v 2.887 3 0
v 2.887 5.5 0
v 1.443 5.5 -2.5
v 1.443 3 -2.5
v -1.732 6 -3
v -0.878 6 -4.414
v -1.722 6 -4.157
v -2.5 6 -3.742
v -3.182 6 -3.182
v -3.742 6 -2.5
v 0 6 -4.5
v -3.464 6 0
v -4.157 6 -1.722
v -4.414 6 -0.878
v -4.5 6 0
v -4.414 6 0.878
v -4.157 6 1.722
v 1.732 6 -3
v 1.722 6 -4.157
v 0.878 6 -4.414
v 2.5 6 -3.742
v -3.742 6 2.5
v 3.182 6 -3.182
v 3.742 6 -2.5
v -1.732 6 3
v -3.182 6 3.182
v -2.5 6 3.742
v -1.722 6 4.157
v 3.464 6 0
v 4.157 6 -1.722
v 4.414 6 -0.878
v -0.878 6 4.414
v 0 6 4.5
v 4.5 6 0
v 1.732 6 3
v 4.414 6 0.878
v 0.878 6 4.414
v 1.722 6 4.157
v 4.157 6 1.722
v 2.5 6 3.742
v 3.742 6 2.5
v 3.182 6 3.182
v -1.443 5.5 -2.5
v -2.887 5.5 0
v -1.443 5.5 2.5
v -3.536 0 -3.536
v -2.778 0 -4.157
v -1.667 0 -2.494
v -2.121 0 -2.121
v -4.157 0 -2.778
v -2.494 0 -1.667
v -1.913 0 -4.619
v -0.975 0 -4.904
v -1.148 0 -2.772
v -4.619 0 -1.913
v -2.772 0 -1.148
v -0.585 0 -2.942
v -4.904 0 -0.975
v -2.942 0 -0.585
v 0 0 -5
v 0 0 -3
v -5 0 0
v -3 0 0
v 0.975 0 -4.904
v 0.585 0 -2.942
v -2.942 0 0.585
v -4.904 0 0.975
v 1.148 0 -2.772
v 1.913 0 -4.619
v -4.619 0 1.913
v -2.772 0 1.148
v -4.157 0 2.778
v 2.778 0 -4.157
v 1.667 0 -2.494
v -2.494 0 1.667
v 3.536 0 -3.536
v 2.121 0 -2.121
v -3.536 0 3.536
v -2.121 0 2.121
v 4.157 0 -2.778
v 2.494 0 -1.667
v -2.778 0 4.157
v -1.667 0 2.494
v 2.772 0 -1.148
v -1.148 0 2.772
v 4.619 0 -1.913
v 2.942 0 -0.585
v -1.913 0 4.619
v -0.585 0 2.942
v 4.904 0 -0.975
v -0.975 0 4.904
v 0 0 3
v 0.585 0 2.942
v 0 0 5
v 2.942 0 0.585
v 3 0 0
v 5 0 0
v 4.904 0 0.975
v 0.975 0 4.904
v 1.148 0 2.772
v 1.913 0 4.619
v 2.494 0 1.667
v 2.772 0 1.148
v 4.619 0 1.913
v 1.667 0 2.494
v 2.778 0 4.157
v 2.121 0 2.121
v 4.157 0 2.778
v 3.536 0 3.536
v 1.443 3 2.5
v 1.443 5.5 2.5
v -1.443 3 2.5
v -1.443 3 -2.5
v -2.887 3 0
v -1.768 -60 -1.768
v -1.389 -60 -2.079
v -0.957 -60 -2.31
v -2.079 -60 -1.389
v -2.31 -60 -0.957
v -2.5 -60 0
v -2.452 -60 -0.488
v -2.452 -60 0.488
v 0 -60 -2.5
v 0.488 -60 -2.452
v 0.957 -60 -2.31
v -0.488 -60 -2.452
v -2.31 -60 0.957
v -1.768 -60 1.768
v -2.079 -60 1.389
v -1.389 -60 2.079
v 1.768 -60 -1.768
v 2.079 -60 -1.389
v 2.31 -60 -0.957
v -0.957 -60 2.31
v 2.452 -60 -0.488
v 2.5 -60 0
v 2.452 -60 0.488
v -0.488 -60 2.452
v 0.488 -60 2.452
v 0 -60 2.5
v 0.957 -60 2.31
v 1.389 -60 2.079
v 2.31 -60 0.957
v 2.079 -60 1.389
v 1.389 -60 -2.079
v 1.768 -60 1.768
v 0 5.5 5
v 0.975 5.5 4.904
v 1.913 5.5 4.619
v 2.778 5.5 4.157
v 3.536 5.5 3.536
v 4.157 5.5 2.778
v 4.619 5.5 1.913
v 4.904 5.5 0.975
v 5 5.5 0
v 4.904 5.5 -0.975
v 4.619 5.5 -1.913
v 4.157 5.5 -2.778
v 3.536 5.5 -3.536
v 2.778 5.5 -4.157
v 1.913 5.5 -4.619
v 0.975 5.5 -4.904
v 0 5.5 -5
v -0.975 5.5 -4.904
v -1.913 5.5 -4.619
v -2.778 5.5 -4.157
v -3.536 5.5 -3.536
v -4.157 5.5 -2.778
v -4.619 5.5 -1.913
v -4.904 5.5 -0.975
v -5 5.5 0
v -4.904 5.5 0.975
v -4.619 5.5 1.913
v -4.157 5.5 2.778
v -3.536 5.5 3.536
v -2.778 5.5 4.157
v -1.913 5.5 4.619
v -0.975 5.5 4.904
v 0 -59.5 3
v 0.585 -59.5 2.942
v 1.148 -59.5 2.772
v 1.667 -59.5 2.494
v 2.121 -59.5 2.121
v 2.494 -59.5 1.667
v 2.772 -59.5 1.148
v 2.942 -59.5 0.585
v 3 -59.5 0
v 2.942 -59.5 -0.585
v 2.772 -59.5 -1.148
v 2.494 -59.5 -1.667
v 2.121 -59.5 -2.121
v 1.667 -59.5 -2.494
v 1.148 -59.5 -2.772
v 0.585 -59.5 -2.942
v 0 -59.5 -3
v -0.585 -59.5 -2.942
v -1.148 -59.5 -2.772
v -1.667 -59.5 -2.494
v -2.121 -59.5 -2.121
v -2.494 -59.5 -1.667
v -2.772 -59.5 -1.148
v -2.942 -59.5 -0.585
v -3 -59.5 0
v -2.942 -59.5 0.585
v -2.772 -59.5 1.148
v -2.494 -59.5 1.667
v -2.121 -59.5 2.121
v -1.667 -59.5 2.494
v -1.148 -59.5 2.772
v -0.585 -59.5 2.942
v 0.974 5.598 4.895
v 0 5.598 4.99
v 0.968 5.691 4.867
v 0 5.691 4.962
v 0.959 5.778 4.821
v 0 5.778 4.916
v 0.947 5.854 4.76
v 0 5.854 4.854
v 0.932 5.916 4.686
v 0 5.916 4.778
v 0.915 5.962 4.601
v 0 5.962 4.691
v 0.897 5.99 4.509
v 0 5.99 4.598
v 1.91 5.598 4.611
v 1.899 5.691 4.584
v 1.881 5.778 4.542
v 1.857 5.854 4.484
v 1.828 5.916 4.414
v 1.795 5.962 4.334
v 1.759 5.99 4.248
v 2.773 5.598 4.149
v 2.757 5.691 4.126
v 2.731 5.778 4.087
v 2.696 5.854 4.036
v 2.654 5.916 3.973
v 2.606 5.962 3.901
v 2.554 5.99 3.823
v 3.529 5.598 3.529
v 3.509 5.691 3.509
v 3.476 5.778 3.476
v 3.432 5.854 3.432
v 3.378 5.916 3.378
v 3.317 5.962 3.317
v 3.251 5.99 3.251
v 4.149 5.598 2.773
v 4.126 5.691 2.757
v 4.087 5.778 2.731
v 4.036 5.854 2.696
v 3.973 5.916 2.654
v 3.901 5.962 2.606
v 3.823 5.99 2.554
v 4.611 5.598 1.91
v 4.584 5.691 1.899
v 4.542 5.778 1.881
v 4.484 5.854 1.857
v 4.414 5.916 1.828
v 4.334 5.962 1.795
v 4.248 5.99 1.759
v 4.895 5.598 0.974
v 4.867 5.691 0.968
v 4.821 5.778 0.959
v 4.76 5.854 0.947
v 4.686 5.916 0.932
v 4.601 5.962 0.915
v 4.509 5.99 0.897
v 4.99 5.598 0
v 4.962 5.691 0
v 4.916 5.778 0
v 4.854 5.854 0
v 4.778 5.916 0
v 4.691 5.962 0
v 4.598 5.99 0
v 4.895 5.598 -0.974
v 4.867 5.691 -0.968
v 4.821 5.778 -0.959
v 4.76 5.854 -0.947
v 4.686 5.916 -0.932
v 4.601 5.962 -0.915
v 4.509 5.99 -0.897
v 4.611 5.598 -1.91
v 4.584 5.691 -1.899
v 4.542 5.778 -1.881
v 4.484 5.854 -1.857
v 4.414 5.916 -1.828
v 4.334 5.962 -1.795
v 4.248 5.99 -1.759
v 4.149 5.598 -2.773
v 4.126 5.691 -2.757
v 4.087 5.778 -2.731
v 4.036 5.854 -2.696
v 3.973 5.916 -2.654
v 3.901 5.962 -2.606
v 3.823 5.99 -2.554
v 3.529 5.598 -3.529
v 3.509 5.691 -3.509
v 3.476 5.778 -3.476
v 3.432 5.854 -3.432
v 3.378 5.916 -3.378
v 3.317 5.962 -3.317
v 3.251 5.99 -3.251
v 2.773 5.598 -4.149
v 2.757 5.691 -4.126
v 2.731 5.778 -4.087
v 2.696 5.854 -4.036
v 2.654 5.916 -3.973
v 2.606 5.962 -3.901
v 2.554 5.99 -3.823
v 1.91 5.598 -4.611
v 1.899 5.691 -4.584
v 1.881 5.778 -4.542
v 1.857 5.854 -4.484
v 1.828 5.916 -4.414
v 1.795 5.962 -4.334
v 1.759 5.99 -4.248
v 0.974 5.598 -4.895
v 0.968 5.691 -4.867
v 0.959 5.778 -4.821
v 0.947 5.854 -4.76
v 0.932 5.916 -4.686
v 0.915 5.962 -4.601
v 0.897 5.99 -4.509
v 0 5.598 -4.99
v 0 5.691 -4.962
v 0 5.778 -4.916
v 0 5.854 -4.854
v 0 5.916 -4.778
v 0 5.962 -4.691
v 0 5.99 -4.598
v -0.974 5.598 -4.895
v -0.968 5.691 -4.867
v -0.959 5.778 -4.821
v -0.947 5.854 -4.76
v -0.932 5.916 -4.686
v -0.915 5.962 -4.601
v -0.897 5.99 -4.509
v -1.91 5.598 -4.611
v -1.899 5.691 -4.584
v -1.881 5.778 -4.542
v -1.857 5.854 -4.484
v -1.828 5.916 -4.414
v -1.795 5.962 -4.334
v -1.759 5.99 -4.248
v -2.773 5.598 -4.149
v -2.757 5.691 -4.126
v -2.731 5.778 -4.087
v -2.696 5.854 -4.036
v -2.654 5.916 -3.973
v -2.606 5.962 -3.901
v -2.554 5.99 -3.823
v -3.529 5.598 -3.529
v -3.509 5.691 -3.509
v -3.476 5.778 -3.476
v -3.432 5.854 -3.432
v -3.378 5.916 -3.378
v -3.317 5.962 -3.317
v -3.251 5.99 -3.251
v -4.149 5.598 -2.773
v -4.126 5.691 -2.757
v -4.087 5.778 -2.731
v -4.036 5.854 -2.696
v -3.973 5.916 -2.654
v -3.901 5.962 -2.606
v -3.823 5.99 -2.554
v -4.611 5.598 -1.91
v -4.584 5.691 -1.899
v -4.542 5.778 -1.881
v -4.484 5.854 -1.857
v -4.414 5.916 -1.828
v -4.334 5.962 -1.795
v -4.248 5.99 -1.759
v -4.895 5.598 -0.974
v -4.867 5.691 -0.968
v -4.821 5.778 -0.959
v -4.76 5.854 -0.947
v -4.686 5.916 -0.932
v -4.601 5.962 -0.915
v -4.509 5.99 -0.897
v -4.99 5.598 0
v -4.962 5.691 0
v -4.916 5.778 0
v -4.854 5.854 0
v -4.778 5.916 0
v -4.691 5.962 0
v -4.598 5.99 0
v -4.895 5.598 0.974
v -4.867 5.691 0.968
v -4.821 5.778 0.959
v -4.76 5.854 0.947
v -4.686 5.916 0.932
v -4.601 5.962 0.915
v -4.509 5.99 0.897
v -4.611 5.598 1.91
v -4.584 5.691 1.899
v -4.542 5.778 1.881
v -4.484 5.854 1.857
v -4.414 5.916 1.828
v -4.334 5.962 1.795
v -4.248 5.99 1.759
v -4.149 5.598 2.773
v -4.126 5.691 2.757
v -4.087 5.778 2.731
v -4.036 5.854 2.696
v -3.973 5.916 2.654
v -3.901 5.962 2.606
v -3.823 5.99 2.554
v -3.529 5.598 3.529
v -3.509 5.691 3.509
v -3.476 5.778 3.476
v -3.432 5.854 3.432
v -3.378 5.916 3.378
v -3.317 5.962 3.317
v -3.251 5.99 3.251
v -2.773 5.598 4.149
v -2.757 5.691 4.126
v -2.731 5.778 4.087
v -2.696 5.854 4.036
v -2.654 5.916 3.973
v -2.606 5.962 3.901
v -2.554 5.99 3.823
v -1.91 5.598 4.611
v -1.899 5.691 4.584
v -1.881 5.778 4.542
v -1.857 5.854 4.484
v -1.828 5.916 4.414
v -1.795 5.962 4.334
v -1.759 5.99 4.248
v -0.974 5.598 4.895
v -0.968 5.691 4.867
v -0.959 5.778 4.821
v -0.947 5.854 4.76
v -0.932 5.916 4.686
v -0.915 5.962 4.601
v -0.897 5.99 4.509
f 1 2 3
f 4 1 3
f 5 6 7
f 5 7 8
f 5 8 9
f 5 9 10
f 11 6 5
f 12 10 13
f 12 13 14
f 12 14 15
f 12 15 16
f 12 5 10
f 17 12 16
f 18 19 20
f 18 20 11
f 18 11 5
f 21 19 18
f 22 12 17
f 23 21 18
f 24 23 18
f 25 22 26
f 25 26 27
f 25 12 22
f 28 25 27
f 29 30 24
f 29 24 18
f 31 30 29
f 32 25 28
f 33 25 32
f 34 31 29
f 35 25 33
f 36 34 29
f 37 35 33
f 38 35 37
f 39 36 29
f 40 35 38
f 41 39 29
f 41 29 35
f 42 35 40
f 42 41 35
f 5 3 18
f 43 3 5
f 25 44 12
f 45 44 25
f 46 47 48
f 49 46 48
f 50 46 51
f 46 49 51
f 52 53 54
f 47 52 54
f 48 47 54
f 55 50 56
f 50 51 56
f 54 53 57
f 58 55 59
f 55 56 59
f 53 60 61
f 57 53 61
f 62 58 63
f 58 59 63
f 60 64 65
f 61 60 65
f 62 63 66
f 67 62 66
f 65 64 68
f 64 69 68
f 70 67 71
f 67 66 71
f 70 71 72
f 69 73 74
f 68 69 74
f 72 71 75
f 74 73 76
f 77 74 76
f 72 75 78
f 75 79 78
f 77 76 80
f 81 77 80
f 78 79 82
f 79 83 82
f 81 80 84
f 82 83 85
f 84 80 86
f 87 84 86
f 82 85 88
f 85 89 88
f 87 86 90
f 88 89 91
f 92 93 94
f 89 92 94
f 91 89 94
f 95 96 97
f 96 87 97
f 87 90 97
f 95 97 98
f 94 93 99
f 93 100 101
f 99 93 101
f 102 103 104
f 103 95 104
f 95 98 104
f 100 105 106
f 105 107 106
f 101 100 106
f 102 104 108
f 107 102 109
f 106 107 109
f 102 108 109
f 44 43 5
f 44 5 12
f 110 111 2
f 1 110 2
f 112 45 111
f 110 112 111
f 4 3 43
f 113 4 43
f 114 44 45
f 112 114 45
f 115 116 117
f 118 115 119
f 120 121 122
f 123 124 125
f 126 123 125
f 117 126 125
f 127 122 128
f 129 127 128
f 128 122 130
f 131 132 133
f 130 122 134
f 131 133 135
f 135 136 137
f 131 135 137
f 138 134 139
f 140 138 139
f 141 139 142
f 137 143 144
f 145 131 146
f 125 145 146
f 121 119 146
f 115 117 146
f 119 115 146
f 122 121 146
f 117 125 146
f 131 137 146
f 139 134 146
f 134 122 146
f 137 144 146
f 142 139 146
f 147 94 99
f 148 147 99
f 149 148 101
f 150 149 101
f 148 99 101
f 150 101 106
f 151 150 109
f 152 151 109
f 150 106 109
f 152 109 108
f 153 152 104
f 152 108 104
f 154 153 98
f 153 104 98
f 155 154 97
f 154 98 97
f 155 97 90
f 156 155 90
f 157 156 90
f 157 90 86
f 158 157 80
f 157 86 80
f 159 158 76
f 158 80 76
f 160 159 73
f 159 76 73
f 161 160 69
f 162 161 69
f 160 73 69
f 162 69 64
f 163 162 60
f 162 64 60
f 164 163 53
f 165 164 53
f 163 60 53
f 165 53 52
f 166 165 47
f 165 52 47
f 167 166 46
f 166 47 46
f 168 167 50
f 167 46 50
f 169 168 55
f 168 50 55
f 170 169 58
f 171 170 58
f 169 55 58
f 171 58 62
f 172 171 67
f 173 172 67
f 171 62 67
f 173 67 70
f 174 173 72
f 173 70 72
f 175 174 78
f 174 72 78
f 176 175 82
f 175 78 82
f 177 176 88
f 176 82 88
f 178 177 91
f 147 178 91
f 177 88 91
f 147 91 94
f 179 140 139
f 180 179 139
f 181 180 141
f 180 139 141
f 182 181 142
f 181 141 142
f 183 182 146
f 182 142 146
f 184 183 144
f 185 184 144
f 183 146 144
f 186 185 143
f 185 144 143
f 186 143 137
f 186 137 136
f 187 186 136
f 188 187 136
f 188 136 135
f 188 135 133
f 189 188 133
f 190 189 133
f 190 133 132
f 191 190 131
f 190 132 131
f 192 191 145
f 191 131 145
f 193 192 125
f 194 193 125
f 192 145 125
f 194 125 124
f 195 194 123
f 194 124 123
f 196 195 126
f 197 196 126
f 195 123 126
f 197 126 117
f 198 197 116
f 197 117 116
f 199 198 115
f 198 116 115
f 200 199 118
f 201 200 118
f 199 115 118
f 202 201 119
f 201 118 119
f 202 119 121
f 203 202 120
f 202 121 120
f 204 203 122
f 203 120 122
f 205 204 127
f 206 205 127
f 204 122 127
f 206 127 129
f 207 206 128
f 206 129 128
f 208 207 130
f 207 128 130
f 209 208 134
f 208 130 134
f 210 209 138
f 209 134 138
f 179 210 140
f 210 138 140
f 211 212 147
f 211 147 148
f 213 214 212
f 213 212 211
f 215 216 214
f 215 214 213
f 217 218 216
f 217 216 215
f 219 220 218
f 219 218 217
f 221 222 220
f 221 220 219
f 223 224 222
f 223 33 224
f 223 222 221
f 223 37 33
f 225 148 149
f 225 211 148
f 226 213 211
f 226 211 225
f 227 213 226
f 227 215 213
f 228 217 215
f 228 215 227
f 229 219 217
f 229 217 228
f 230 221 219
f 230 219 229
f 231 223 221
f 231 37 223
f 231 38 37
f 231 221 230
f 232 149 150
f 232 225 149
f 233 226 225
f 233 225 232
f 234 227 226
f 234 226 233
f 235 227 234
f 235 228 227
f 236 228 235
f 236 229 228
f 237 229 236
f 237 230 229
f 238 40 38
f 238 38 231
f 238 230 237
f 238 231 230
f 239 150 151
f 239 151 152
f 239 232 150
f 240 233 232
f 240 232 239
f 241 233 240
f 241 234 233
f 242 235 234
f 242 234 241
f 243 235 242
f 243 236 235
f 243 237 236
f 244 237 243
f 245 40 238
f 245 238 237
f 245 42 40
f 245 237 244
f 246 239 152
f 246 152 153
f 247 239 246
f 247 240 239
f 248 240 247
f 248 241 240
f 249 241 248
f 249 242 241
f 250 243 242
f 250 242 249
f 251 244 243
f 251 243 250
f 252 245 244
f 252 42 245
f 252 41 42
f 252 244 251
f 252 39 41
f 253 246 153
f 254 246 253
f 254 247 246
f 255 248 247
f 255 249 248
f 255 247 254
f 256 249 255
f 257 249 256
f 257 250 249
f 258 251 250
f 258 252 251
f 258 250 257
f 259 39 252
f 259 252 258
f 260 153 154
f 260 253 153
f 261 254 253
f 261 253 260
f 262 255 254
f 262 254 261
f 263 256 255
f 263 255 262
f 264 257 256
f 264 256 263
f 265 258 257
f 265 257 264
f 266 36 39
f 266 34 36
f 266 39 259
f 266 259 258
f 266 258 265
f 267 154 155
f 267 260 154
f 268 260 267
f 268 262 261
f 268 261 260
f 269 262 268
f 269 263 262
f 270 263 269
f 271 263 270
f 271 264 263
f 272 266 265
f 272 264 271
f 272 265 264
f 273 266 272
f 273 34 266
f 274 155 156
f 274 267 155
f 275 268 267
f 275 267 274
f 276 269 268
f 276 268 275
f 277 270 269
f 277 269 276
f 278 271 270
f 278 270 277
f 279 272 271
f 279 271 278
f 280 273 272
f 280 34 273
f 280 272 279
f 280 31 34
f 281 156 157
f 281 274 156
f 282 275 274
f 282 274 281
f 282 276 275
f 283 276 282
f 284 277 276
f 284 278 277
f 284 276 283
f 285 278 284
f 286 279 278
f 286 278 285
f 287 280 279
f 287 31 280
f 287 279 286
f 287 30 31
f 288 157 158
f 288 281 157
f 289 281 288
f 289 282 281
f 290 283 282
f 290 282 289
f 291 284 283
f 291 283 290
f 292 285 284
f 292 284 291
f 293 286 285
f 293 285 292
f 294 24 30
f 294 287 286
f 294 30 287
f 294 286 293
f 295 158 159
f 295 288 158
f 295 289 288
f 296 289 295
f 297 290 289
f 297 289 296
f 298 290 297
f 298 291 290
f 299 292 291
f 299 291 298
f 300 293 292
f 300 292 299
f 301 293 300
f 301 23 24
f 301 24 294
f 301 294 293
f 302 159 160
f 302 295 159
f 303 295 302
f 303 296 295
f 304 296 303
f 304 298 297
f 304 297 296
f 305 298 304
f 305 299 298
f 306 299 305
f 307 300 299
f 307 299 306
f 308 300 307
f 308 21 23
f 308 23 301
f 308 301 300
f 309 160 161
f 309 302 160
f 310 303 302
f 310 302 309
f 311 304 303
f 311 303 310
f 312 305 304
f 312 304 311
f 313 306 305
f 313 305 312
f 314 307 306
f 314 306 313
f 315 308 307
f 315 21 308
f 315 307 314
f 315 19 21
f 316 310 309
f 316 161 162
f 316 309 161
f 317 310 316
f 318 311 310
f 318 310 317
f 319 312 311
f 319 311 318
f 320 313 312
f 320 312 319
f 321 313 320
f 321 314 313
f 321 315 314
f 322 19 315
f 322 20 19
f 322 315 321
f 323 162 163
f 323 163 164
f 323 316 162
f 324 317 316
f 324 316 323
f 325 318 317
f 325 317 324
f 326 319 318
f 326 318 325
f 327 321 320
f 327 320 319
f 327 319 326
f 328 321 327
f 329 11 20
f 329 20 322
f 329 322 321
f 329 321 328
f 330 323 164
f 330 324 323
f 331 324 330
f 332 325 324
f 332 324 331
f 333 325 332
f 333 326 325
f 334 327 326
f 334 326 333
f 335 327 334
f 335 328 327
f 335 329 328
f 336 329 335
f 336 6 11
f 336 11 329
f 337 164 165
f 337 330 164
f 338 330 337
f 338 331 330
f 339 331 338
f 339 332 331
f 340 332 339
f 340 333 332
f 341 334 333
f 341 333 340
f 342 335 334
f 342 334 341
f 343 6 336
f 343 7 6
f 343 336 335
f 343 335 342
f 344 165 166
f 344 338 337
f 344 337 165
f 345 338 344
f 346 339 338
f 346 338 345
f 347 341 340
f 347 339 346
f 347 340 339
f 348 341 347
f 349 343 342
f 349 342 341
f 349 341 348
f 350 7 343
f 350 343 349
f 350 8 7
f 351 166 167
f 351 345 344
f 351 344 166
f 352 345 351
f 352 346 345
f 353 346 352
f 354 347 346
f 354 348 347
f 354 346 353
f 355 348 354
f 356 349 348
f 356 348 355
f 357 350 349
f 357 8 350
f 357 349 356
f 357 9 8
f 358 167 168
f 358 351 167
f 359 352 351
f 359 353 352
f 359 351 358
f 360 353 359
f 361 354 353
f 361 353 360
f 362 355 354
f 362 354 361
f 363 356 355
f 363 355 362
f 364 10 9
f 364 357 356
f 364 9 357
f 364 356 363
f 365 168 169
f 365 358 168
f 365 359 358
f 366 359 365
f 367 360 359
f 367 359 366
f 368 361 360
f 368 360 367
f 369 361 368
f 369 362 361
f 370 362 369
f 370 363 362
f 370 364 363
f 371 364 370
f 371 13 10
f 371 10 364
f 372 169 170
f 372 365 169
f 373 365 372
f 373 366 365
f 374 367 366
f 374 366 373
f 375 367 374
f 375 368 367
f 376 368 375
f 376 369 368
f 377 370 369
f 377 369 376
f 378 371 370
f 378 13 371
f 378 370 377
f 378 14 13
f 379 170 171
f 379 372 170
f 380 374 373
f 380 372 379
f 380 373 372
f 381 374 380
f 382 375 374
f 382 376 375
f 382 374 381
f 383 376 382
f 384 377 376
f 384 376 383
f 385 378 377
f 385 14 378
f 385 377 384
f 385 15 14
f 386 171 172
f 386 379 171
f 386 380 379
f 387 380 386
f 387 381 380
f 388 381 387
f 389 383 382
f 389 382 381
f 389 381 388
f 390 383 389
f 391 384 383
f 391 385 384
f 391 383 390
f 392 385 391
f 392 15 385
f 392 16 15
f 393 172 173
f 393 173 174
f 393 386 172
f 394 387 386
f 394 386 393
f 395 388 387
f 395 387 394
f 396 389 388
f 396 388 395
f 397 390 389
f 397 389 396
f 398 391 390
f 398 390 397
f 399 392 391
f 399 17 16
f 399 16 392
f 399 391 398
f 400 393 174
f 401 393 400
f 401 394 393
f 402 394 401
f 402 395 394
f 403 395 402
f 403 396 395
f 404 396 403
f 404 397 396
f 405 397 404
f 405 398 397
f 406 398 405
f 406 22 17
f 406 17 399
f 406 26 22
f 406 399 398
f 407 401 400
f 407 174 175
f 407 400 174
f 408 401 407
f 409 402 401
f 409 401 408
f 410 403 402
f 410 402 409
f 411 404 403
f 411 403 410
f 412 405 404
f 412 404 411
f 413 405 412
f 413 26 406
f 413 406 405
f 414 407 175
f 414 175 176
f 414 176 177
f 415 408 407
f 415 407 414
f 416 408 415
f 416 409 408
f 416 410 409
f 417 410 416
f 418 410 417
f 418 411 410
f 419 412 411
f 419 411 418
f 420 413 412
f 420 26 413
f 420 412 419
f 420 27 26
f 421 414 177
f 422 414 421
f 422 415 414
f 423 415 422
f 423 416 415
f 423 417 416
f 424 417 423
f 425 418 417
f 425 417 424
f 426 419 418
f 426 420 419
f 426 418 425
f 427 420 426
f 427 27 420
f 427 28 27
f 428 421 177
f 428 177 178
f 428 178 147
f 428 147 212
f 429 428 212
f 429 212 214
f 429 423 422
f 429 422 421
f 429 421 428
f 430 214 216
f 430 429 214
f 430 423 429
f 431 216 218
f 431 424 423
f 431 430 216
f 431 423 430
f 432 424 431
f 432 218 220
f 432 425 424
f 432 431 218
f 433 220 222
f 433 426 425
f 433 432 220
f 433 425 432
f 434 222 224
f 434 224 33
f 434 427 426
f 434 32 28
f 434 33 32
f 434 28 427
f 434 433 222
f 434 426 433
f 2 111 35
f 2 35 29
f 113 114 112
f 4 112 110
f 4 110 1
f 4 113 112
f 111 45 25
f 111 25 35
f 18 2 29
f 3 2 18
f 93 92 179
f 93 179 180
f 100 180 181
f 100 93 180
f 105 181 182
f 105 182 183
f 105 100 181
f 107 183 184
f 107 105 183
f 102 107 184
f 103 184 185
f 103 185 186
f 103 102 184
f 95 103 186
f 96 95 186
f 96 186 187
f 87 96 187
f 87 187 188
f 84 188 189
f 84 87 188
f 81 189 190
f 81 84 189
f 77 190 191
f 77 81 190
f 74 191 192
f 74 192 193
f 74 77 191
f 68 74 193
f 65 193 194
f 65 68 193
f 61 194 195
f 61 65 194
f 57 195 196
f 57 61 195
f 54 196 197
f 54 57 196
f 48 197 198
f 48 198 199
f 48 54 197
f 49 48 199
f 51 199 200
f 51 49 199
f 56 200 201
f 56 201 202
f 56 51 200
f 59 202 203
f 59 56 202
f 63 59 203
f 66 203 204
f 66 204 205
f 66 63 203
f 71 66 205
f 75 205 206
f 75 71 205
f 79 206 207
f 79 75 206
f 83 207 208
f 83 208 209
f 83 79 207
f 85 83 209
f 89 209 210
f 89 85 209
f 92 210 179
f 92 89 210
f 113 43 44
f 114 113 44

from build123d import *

# Parameters (mm, degrees)
ESBO_O1_R                = 3
RESSALTO_EXTRUS_O1_DEPTH = 60
ESBO_O2_R                = 5
RESSALTO_EXTRUS_O2_DEPTH = 6
FILETE1_R                = 0.5
CORTE_EXTRUS_O1_DEPTH    = 3
CHANFRO3_SIZE            = 0.5
CHANFRO4_SIZE            = 0.5


with BuildPart() as part:
    # Esboço1 → Ressalto-extrusão1 (new body)
    with BuildSketch(Plane(origin=(0, 0, 0), x_dir=(1, 0, 0), z_dir=(0, 1, 0))):
        with Locations(Location((0, 0, 0), (0, 0, 270))):
            Circle(ESBO_O1_R)
    extrude(amount=-RESSALTO_EXTRUS_O1_DEPTH)

    # Esboço2 → Ressalto-extrusão2 (add)
    with BuildSketch(Plane(origin=(0, 0, 0), x_dir=(1, 0, 0), z_dir=(0, 1, 0))):
        with Locations(Location((0, 0, 0), (0, 0, 270))):
            Circle(ESBO_O2_R)
    extrude(amount=RESSALTO_EXTRUS_O2_DEPTH)

    # Filete1
    filete1_edges = [part.edges().sort_by_distance(p)[0] for p in [
        (0, 6, -5),
    ]]
    fillet(filete1_edges, radius=FILETE1_R)

    # Esboço3 → Corte-extrusão1 (cut)
    with BuildSketch(Plane(origin=(0, 6, 0), x_dir=(1, 0, 0), z_dir=(0, 1, 0))):
        Polygon((2.886751346, 0), (1.443375673, 2.5), (-1.443375673, 2.5), (-2.886751346, 0), (-1.443375673, -2.5), (1.443375673, -2.5), align=None)
    extrude(amount=-CORTE_EXTRUS_O1_DEPTH, mode=Mode.SUBTRACT)

    # Chanfro3
    chanfro3_edges = [part.edges().sort_by_distance(p)[0] for p in [
        (2.165063509, 6, 1.25),
        (2.165063509, 6, -1.25),
        (0, 6, -2.5),
        (-2.165063509, 6, -1.25),
        (-2.165063509, 6, 1.25),
        (0, 6, 2.5),
    ]]
    chamfer(chanfro3_edges, length=CHANFRO3_SIZE)

    # Chanfro4
    chanfro4_edges = [part.edges().sort_by_distance(p)[0] for p in [
        (0, -60, -3),
    ]]
    chamfer(chanfro4_edges, length=CHANFRO4_SIZE)


solid = part.part
